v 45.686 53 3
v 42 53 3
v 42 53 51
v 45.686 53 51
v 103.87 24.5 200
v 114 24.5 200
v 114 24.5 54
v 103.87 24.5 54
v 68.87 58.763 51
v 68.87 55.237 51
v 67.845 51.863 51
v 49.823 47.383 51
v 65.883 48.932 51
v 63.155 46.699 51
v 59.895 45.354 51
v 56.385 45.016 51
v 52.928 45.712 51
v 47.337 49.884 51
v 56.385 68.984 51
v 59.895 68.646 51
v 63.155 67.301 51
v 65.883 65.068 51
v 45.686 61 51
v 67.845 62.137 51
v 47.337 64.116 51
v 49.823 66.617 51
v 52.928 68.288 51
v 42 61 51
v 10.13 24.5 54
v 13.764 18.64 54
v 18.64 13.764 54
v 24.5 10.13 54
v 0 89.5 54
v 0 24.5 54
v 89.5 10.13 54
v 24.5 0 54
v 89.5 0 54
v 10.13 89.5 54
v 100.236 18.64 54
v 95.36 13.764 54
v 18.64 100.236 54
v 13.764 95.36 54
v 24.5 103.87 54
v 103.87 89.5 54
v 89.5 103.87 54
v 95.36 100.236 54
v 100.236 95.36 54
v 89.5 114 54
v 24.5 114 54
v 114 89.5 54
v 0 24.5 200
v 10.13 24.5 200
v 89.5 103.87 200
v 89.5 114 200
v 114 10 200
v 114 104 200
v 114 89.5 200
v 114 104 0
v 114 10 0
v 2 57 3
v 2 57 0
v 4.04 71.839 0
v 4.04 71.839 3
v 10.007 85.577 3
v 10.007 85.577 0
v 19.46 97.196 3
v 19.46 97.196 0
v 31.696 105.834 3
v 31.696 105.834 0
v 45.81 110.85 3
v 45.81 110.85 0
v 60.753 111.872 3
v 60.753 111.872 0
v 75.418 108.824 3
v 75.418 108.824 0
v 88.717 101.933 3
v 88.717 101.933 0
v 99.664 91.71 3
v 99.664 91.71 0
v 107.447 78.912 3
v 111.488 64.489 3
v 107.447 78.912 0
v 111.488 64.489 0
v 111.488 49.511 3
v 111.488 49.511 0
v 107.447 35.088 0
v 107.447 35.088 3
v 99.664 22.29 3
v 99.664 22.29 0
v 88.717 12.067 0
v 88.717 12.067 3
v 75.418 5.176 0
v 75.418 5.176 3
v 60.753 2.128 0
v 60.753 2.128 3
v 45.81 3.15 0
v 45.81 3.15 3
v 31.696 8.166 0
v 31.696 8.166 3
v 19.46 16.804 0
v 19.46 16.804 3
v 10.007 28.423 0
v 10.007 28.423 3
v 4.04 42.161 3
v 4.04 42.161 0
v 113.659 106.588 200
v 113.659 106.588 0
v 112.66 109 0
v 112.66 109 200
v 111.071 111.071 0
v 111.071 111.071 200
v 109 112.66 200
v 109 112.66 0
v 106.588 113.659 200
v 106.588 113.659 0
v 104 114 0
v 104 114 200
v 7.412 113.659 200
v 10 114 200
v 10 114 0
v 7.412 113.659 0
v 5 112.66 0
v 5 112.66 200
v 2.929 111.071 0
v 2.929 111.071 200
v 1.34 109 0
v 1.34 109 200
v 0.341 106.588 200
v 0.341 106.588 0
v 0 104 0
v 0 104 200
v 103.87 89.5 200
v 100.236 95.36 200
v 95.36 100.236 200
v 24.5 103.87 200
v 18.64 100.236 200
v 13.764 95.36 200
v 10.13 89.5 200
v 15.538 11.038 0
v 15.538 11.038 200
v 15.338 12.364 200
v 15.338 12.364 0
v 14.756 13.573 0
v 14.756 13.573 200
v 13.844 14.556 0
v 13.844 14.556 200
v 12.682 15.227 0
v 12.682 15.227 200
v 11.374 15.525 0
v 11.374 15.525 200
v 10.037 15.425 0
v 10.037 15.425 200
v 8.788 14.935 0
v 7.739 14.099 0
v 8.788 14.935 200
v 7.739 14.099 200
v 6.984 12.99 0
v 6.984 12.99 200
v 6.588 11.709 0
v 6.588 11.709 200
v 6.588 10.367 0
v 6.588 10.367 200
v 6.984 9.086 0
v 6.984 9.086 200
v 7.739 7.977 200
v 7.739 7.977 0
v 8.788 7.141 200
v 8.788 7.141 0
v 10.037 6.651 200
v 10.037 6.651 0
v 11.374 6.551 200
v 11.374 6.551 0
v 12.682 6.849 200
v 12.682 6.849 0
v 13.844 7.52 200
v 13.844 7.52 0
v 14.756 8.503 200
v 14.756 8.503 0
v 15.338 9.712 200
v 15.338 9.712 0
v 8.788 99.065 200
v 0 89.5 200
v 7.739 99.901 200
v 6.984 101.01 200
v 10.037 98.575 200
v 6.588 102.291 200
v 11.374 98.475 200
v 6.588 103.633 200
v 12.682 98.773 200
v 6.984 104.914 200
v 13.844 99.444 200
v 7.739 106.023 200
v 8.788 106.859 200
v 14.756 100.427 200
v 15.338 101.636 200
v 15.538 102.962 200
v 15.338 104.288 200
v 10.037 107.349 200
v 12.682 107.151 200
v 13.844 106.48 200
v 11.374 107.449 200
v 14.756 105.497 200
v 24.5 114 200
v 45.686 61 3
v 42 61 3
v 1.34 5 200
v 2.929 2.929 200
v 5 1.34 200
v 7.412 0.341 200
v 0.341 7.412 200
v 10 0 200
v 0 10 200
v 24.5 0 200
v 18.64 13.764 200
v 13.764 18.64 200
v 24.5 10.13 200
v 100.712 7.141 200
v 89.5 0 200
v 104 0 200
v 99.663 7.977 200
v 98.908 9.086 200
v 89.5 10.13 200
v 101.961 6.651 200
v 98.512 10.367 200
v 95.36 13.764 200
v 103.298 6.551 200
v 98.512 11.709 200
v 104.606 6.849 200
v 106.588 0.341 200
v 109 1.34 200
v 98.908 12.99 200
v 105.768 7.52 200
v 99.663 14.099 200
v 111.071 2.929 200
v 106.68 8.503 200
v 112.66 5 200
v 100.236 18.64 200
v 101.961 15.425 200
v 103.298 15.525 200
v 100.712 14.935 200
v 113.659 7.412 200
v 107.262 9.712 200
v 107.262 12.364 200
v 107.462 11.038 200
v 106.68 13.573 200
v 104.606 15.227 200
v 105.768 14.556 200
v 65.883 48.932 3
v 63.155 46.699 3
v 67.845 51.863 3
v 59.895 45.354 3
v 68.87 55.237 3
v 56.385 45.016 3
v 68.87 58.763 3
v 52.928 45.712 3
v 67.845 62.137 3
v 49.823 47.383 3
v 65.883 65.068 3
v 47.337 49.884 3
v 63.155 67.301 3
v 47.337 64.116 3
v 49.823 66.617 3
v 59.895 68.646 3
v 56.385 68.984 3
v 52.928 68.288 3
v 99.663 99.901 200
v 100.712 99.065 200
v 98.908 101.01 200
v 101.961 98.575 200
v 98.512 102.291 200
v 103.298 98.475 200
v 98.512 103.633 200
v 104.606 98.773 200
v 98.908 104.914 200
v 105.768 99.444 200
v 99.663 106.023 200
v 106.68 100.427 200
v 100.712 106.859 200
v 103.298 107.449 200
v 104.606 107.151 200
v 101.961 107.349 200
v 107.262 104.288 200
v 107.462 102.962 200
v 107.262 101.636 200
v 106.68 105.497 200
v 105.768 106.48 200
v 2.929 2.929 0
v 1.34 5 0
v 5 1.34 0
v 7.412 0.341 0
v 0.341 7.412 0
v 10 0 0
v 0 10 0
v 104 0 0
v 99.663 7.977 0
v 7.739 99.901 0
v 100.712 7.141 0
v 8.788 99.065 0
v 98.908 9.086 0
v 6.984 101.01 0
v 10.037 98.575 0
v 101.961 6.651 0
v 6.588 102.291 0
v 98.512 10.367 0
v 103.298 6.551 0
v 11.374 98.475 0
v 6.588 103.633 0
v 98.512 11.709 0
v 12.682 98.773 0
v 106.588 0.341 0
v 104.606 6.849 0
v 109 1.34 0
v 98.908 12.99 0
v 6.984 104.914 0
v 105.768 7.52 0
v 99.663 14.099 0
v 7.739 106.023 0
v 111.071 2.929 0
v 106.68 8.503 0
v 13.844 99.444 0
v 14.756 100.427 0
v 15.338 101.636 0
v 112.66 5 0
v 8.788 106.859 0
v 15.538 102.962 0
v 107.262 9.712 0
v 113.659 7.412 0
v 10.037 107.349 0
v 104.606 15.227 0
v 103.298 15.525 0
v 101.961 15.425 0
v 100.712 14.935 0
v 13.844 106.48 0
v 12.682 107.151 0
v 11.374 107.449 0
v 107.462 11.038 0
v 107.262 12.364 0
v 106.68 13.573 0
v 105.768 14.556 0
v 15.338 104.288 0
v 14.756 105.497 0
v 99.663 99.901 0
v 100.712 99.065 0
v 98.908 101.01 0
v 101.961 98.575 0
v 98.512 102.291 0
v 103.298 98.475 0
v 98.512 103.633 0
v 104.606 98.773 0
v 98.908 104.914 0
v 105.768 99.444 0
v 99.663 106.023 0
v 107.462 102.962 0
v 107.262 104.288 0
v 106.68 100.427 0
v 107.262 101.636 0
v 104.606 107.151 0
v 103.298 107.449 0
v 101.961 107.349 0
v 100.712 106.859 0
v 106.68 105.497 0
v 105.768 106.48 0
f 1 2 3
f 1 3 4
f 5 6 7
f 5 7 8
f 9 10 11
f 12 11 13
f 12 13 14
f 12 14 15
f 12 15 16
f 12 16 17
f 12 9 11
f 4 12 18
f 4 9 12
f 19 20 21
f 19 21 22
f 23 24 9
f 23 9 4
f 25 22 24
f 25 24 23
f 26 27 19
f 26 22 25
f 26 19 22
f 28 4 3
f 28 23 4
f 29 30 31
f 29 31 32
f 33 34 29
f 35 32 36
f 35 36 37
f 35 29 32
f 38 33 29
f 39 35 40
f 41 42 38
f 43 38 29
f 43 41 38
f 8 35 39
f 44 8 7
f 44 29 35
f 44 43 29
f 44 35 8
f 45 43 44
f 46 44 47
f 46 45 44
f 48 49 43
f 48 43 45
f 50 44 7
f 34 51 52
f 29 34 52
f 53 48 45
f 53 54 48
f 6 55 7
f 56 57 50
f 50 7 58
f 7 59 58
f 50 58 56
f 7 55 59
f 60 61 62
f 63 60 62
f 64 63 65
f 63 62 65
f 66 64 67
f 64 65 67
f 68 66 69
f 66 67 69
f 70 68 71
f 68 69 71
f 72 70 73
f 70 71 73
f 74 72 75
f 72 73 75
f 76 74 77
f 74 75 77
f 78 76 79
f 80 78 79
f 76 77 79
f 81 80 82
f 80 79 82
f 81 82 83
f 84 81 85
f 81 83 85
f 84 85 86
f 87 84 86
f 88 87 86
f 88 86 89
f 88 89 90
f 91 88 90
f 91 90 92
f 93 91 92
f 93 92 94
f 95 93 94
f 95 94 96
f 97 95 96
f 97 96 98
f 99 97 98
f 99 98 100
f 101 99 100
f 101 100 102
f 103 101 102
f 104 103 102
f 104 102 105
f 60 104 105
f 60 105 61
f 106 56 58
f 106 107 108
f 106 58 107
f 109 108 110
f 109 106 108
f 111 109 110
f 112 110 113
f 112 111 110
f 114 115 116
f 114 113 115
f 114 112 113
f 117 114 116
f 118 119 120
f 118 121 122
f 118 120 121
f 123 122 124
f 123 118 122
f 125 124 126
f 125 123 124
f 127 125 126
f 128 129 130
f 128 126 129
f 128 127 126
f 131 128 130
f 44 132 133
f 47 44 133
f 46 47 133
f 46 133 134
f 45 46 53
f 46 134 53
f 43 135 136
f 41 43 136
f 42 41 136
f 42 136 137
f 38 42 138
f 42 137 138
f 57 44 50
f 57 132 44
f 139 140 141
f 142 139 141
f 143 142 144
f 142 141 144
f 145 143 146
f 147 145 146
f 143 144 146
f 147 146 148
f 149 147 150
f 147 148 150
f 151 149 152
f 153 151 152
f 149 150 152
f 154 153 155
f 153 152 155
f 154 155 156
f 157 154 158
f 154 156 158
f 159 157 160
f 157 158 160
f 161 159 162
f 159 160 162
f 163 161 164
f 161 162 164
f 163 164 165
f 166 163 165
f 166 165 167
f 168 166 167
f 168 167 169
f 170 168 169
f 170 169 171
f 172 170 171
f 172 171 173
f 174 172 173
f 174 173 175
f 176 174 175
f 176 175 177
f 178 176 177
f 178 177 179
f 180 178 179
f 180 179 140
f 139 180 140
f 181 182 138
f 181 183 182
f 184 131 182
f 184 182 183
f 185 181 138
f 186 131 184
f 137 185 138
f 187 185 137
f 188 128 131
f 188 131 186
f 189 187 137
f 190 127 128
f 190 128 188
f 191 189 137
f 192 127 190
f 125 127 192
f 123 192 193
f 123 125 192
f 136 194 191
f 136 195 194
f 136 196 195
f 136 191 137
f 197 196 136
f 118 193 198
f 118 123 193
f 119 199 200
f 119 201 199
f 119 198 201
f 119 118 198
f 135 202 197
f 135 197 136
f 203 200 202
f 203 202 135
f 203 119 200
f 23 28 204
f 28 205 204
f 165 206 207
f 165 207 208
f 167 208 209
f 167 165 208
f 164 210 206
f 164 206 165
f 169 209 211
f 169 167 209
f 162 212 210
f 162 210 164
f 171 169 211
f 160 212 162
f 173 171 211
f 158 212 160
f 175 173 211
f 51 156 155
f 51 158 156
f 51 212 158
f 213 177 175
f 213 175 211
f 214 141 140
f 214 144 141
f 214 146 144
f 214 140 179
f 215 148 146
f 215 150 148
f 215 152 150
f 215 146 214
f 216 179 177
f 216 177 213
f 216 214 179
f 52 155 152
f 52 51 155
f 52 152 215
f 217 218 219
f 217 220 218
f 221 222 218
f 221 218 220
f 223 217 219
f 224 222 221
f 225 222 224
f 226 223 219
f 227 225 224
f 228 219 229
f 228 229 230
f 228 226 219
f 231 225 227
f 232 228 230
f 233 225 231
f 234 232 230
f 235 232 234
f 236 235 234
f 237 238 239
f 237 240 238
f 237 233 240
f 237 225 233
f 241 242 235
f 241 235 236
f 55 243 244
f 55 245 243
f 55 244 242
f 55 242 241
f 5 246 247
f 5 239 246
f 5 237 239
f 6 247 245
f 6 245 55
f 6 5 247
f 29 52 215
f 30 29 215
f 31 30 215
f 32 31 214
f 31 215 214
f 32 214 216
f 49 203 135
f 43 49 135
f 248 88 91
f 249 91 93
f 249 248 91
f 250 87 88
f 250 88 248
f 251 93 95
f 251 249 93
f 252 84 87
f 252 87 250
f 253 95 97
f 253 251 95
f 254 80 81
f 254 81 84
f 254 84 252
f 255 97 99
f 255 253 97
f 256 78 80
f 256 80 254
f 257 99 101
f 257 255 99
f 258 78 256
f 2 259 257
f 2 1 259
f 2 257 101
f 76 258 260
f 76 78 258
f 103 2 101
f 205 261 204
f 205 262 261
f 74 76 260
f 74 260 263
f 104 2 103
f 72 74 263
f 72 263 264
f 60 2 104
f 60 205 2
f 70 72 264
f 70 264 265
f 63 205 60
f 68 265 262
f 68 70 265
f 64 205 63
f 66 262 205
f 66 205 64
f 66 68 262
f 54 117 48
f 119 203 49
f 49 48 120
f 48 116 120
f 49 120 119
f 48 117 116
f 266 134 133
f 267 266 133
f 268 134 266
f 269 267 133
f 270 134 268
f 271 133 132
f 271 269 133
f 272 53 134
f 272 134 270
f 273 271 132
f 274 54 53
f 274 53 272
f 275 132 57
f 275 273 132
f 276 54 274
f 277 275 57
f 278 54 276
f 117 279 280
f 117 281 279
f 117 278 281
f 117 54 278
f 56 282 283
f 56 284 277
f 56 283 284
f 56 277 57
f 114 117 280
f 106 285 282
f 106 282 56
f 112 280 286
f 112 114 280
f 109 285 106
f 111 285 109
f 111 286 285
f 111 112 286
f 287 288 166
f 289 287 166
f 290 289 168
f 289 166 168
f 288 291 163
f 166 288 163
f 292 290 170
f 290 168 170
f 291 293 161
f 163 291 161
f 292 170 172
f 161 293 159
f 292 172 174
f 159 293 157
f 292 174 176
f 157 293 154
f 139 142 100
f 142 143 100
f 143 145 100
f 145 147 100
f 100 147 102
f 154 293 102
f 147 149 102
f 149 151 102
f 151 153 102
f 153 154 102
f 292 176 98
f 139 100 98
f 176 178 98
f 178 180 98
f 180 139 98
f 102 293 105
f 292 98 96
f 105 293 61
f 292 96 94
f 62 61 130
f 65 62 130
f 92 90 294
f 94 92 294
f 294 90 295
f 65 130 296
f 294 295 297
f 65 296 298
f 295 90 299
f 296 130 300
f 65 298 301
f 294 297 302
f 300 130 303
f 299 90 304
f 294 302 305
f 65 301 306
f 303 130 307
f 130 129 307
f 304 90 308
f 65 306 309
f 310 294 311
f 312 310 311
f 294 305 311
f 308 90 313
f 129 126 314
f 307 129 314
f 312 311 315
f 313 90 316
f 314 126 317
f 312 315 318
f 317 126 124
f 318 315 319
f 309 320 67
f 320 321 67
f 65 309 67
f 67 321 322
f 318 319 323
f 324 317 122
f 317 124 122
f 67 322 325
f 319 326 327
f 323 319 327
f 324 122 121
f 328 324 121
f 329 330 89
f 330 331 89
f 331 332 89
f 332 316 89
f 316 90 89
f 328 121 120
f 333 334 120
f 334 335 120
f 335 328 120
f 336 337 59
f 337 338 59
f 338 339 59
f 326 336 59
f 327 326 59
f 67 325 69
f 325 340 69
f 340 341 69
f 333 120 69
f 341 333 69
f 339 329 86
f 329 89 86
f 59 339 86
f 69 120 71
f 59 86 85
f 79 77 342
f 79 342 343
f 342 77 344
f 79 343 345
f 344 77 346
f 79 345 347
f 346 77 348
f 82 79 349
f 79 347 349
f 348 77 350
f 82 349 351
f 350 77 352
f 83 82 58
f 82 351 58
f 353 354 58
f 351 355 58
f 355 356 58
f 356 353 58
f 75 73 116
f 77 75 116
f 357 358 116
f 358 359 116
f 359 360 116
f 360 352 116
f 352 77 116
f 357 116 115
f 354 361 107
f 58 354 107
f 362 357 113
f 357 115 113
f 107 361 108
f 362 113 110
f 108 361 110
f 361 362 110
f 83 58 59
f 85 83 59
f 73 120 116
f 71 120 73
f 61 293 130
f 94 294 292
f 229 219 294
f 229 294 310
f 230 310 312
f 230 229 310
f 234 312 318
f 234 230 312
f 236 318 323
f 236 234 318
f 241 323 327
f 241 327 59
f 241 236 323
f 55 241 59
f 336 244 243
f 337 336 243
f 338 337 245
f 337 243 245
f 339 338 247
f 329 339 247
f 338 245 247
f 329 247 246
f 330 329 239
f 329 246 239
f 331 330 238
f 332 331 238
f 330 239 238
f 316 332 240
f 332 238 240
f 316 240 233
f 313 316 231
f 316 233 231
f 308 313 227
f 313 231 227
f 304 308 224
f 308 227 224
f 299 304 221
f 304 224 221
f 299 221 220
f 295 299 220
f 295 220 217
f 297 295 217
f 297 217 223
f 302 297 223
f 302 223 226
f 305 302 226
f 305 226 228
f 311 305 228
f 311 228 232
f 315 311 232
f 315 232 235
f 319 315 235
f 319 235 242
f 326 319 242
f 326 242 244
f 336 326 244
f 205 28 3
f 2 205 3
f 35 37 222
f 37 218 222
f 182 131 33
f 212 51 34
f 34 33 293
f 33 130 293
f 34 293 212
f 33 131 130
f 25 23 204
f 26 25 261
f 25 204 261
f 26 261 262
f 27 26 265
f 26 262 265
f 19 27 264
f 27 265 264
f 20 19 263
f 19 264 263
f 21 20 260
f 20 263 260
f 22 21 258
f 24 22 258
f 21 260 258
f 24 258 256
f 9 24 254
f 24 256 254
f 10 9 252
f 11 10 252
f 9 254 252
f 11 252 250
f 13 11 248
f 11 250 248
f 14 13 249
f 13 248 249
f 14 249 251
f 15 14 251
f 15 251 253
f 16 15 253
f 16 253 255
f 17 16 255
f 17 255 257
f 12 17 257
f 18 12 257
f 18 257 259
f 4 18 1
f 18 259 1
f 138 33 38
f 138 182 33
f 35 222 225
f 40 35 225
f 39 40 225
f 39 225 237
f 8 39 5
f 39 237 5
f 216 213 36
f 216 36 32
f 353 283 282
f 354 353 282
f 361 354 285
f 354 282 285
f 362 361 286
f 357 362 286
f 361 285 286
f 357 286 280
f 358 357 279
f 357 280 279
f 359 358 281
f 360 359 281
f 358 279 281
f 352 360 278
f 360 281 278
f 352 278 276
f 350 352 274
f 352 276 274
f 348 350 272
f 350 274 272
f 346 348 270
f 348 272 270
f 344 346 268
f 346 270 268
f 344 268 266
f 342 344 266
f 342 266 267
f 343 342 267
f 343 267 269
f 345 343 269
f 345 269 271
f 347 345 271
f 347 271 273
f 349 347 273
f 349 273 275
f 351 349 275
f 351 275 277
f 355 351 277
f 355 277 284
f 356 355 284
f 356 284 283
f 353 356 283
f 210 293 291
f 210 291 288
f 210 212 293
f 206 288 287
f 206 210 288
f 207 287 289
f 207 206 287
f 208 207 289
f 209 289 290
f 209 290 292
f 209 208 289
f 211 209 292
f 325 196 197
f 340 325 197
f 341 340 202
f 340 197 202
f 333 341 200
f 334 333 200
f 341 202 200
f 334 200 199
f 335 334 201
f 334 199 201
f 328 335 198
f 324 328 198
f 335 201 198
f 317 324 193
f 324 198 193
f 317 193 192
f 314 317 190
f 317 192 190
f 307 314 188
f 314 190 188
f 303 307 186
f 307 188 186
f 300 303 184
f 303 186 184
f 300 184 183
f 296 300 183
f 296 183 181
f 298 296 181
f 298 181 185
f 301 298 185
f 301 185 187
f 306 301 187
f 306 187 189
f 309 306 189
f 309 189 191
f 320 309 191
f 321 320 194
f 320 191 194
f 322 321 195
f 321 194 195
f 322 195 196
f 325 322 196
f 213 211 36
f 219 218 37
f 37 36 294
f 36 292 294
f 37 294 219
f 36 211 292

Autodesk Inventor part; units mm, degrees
ref_plane "YZ Plane" through (0, 0, 0) normal (1, 0, 0) x (0, 1, 0)
ref_plane "XZ Plane" through (0, 0, 0) normal (0, 1, 0) x (-1, 0, 0)
ref_plane "XY Plane" through (0, 0, 0) normal (0, 0, 1) x (1, 0, 0)
sketch "Sketch1" plane through (0, 0, 0) normal (0, 0, 1) x (1, 0, 0)
  line L0 (0, 0) -> (114, 0)
  line L1 (114, 0) -> (114, 114)
  line L2 (114, 114) -> (0, 114)
  line L3 (0, 114) -> (0, 0)
  dimension "d0" = 114
  dimension "d1" = 114
extrude "Extrusion1" add sketch "Sketch1" along normal blind 200
fillet "Fillet1" radius 10 1 edges at (0, 114, 100)
fillet "Fillet2" radius 10 3 edges at (114, 114, 100) (114, 0, 100) (0, 0, 100)
sketch "Sketch3" plane through (0, 0, 200) normal (0, 0, 1) x (1, 0, 0)
  circle A0 centre (11.038, 11.038) radius 4.5
  line L0 (10, 0) -> (104, 0) projected
  line L1 (0, 104) -> (0, 10) projected
  circle A1 centre (11.038, 102.962) radius 4.5
  circle A2 centre (102.962, 102.962) radius 4.5
  circle A3 centre (102.962, 11.038) radius 4.5
  line L2 (104, 114) -> (10, 114) projected
  line L3 (114, 10) -> (114, 104) projected
  point P0 (0, 0)
  dimension "d11" = 9
  dimension "d12" = 11.038
  dimension "d13" = 11.038
  dimension "d14" = 9
  dimension "d15" = 9
  dimension "d16" = 9
  dimension "d17" = 11.038
  dimension "d18" = 11.038
  dimension "d19" = 11.038
  dimension "d20" = 11.038
  dimension "d21" = 11.038
  dimension "d22" = 11.038
extrude "Extrusion3" cut sketch "Sketch3" against normal blind 500
sketch "Sketch6" plane through (0, 0, 200) normal (0, 0, 1) x (1, 0, 0)
  arc A0 (0, 10) -> (10, 0) centre (10, 10) ccw projected
  line L0 (0, 10) -> (0, 24.5)
  line L1 (0, 104) -> (0, 10) projected
  line L2 (0, 24.5) -> (10.13, 24.5)
  line L3 (10, 0) -> (24.5, 0)
  line L4 (10, 0) -> (104, 0) projected
  line L5 (24.5, 0) -> (24.5, 10.13)
  arc A1 (10.13, 24.5) -> (24.5, 10.13) centre (37.2744, 37.2744) ccw
  arc A2 (10, 114) -> (0, 104) centre (10, 104) ccw projected
  line L6 (10, 114) -> (24.5, 114)
  line L7 (104, 114) -> (10, 114) projected
  line L8 (24.5, 114) -> (24.5, 103.87)
  line L9 (0, 104) -> (0, 89.5)
  line L10 (0, 89.5) -> (10.13, 89.5)
  arc A3 (24.5, 103.87) -> (10.13, 89.5) centre (37.2744, 76.7256) ccw
  line L11 (104, 114) -> (89.5, 114)
  line L12 (89.5, 114) -> (89.5, 103.87)
  line L13 (114, 10) -> (114, 104) projected
  line L14 (114, 104) -> (114, 89.5)
  line L15 (114, 89.5) -> (114, 99.63)
  arc A4 (103.87, 89.5) -> (89.5, 103.87) centre (76.7256, 76.7256) ccw
  line L16 (103.87, 89.5) -> (114, 89.5)
  line L17 (114, 10) -> (114, 24.5)
  line L18 (114, 24.5) -> (103.87, 24.5)
  line L19 (104, 0) -> (89.5, 0)
  line L20 (89.5, 0) -> (89.5, 10.13)
  arc A5 (89.5, 10.13) -> (103.87, 24.5) centre (76.7256, 37.2744) ccw
  point P0 (0, 0)
  dimension "d30" = 14.5
  dimension "d31" = 10.13
  dimension "d32" = 14.5
  dimension "d33" = 10.13
  dimension "d34" = 30
  dimension "d35" = 14.5
  dimension "d36" = 10.13
  dimension "d37" = 14.5
  dimension "d38" = 10.13
  dimension "d39" = 30
  dimension "d40" = 14.5
  dimension "d41" = 10.13
  dimension "d42" = 14.5
  dimension "d44" = 30
  dimension "d45" = 10.13
  dimension "d46" = 14.5
  dimension "d47" = 10.13
  dimension "d48" = 14.5
  dimension "d49" = 10.13
  dimension "d50" = 30
extrude "Extrusion5" cut sketch "Sketch6" against normal blind 146 and the other way blind 73 contours L1 L10 A3 L8 L7 L12 A4 L16 L13 L18 A5 L20 L4 L5 A1 L2
sketch "Sketch7" plane through (0, 0, 0) normal (0, 0, -1) x (-1, 0, 0)
  line L0 (0, 104) -> (0, 10) projected
  line L1 (-10, 0) -> (-104, 0) projected
  circle A0 centre (-57, 57) radius 55
  point P0 (0, 0)
  dimension "d58" = 110
extrude "Extrusion6" cut sketch "Sketch7" against normal blind 3
sketch "Sketch9" plane through (57, 57, 3) normal (0, 0, -1) x (-1, 0, 0)
  circle A0 centre (0, 0) radius 12
  line L0 (47, -57) -> (-47, -57) projected
  line L1 (57, 47) -> (57, -47) projected
  point P0 (57, -57)
  point P1 (0, -57)
  dimension "d66" = 24
  dimension "d68" = 57
  dimension "d69" = 57
extrude "Extrusion8" cut sketch "Sketch9" against normal blind 48
sketch "Sketch10" plane through (57, 57, 3) normal (0, 0, -1) x (-1, 0, 0)
  circle A0 centre (0, 0) radius 12 projected
  line L0 (12, 0) -> (15, 0)
  line L1 (15, 4) -> (15, -4)
  line L2 (15, 4) -> (11.3137, 4)
  line L3 (15, -4) -> (11.3137, -4)
  point P0 (57, -57)
  dimension "d72" = 15
  dimension "d73" = 8
  dimension "d74" = 4
  dimension "d75" = 57
  dimension "d76" = 42
extrude "Extrusion9" cut sketch "Sketch10" against normal blind 48 contours L0 L1 L3 A0 | A0 L2 L1 L0
equation "\"d13\" = d12"
equation "\"d17\" = d12"
equation "\"d18\" = d13"
equation "\"d19\" = d18"
equation "\"d20\" = d18"
equation "\"d21\" = d19"
equation "\"d22\" = d21"
equation "\"d33\" = d31"
properties part number "BackPlate"
